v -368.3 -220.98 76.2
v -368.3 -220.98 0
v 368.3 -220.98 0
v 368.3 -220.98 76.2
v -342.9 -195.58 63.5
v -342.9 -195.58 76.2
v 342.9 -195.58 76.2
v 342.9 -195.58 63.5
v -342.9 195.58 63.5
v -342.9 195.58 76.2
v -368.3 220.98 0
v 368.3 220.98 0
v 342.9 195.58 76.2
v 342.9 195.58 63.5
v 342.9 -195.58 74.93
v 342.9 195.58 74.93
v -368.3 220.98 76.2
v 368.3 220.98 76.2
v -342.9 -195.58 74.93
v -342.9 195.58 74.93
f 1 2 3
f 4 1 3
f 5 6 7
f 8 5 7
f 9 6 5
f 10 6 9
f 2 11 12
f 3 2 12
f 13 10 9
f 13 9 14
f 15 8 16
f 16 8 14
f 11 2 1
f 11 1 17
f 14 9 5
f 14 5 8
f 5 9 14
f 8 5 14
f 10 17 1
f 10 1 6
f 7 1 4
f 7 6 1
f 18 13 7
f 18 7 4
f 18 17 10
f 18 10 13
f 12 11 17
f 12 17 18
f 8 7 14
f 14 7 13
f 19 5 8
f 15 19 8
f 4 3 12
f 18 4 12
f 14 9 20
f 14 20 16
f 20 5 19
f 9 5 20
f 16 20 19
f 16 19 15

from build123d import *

# Parameters (mm, degrees)
F1_W     = 736.6
F1_H     = 441.96
F2_DEPTH = 76.2
F3_W     = 685.8
F3_H     = 391.16
F4_DEPTH = 12.7
F5_W     = 685.8
F5_H     = 391.16
F6_DEPTH = 11.43


with BuildPart() as f2:
    # F1 (on Top) → F2 (new body)
    with BuildSketch(Plane.XY):
        Rectangle(F1_W, F1_H)
    extrude(amount=F2_DEPTH)

    # F3 (on face) → F4 (cut)
    with BuildSketch(Plane.XY.offset(76.2)):
        Rectangle(F3_W, F3_H)
    extrude(amount=-F4_DEPTH, mode=Mode.SUBTRACT)


with BuildPart() as f6:
    # F5 (on face) → F6 (new body)
    with BuildSketch(Plane.XY.offset(63.5)):
        Rectangle(F5_W, F5_H)
    extrude(amount=F6_DEPTH)


solid = Compound([f2.part, f6.part])
